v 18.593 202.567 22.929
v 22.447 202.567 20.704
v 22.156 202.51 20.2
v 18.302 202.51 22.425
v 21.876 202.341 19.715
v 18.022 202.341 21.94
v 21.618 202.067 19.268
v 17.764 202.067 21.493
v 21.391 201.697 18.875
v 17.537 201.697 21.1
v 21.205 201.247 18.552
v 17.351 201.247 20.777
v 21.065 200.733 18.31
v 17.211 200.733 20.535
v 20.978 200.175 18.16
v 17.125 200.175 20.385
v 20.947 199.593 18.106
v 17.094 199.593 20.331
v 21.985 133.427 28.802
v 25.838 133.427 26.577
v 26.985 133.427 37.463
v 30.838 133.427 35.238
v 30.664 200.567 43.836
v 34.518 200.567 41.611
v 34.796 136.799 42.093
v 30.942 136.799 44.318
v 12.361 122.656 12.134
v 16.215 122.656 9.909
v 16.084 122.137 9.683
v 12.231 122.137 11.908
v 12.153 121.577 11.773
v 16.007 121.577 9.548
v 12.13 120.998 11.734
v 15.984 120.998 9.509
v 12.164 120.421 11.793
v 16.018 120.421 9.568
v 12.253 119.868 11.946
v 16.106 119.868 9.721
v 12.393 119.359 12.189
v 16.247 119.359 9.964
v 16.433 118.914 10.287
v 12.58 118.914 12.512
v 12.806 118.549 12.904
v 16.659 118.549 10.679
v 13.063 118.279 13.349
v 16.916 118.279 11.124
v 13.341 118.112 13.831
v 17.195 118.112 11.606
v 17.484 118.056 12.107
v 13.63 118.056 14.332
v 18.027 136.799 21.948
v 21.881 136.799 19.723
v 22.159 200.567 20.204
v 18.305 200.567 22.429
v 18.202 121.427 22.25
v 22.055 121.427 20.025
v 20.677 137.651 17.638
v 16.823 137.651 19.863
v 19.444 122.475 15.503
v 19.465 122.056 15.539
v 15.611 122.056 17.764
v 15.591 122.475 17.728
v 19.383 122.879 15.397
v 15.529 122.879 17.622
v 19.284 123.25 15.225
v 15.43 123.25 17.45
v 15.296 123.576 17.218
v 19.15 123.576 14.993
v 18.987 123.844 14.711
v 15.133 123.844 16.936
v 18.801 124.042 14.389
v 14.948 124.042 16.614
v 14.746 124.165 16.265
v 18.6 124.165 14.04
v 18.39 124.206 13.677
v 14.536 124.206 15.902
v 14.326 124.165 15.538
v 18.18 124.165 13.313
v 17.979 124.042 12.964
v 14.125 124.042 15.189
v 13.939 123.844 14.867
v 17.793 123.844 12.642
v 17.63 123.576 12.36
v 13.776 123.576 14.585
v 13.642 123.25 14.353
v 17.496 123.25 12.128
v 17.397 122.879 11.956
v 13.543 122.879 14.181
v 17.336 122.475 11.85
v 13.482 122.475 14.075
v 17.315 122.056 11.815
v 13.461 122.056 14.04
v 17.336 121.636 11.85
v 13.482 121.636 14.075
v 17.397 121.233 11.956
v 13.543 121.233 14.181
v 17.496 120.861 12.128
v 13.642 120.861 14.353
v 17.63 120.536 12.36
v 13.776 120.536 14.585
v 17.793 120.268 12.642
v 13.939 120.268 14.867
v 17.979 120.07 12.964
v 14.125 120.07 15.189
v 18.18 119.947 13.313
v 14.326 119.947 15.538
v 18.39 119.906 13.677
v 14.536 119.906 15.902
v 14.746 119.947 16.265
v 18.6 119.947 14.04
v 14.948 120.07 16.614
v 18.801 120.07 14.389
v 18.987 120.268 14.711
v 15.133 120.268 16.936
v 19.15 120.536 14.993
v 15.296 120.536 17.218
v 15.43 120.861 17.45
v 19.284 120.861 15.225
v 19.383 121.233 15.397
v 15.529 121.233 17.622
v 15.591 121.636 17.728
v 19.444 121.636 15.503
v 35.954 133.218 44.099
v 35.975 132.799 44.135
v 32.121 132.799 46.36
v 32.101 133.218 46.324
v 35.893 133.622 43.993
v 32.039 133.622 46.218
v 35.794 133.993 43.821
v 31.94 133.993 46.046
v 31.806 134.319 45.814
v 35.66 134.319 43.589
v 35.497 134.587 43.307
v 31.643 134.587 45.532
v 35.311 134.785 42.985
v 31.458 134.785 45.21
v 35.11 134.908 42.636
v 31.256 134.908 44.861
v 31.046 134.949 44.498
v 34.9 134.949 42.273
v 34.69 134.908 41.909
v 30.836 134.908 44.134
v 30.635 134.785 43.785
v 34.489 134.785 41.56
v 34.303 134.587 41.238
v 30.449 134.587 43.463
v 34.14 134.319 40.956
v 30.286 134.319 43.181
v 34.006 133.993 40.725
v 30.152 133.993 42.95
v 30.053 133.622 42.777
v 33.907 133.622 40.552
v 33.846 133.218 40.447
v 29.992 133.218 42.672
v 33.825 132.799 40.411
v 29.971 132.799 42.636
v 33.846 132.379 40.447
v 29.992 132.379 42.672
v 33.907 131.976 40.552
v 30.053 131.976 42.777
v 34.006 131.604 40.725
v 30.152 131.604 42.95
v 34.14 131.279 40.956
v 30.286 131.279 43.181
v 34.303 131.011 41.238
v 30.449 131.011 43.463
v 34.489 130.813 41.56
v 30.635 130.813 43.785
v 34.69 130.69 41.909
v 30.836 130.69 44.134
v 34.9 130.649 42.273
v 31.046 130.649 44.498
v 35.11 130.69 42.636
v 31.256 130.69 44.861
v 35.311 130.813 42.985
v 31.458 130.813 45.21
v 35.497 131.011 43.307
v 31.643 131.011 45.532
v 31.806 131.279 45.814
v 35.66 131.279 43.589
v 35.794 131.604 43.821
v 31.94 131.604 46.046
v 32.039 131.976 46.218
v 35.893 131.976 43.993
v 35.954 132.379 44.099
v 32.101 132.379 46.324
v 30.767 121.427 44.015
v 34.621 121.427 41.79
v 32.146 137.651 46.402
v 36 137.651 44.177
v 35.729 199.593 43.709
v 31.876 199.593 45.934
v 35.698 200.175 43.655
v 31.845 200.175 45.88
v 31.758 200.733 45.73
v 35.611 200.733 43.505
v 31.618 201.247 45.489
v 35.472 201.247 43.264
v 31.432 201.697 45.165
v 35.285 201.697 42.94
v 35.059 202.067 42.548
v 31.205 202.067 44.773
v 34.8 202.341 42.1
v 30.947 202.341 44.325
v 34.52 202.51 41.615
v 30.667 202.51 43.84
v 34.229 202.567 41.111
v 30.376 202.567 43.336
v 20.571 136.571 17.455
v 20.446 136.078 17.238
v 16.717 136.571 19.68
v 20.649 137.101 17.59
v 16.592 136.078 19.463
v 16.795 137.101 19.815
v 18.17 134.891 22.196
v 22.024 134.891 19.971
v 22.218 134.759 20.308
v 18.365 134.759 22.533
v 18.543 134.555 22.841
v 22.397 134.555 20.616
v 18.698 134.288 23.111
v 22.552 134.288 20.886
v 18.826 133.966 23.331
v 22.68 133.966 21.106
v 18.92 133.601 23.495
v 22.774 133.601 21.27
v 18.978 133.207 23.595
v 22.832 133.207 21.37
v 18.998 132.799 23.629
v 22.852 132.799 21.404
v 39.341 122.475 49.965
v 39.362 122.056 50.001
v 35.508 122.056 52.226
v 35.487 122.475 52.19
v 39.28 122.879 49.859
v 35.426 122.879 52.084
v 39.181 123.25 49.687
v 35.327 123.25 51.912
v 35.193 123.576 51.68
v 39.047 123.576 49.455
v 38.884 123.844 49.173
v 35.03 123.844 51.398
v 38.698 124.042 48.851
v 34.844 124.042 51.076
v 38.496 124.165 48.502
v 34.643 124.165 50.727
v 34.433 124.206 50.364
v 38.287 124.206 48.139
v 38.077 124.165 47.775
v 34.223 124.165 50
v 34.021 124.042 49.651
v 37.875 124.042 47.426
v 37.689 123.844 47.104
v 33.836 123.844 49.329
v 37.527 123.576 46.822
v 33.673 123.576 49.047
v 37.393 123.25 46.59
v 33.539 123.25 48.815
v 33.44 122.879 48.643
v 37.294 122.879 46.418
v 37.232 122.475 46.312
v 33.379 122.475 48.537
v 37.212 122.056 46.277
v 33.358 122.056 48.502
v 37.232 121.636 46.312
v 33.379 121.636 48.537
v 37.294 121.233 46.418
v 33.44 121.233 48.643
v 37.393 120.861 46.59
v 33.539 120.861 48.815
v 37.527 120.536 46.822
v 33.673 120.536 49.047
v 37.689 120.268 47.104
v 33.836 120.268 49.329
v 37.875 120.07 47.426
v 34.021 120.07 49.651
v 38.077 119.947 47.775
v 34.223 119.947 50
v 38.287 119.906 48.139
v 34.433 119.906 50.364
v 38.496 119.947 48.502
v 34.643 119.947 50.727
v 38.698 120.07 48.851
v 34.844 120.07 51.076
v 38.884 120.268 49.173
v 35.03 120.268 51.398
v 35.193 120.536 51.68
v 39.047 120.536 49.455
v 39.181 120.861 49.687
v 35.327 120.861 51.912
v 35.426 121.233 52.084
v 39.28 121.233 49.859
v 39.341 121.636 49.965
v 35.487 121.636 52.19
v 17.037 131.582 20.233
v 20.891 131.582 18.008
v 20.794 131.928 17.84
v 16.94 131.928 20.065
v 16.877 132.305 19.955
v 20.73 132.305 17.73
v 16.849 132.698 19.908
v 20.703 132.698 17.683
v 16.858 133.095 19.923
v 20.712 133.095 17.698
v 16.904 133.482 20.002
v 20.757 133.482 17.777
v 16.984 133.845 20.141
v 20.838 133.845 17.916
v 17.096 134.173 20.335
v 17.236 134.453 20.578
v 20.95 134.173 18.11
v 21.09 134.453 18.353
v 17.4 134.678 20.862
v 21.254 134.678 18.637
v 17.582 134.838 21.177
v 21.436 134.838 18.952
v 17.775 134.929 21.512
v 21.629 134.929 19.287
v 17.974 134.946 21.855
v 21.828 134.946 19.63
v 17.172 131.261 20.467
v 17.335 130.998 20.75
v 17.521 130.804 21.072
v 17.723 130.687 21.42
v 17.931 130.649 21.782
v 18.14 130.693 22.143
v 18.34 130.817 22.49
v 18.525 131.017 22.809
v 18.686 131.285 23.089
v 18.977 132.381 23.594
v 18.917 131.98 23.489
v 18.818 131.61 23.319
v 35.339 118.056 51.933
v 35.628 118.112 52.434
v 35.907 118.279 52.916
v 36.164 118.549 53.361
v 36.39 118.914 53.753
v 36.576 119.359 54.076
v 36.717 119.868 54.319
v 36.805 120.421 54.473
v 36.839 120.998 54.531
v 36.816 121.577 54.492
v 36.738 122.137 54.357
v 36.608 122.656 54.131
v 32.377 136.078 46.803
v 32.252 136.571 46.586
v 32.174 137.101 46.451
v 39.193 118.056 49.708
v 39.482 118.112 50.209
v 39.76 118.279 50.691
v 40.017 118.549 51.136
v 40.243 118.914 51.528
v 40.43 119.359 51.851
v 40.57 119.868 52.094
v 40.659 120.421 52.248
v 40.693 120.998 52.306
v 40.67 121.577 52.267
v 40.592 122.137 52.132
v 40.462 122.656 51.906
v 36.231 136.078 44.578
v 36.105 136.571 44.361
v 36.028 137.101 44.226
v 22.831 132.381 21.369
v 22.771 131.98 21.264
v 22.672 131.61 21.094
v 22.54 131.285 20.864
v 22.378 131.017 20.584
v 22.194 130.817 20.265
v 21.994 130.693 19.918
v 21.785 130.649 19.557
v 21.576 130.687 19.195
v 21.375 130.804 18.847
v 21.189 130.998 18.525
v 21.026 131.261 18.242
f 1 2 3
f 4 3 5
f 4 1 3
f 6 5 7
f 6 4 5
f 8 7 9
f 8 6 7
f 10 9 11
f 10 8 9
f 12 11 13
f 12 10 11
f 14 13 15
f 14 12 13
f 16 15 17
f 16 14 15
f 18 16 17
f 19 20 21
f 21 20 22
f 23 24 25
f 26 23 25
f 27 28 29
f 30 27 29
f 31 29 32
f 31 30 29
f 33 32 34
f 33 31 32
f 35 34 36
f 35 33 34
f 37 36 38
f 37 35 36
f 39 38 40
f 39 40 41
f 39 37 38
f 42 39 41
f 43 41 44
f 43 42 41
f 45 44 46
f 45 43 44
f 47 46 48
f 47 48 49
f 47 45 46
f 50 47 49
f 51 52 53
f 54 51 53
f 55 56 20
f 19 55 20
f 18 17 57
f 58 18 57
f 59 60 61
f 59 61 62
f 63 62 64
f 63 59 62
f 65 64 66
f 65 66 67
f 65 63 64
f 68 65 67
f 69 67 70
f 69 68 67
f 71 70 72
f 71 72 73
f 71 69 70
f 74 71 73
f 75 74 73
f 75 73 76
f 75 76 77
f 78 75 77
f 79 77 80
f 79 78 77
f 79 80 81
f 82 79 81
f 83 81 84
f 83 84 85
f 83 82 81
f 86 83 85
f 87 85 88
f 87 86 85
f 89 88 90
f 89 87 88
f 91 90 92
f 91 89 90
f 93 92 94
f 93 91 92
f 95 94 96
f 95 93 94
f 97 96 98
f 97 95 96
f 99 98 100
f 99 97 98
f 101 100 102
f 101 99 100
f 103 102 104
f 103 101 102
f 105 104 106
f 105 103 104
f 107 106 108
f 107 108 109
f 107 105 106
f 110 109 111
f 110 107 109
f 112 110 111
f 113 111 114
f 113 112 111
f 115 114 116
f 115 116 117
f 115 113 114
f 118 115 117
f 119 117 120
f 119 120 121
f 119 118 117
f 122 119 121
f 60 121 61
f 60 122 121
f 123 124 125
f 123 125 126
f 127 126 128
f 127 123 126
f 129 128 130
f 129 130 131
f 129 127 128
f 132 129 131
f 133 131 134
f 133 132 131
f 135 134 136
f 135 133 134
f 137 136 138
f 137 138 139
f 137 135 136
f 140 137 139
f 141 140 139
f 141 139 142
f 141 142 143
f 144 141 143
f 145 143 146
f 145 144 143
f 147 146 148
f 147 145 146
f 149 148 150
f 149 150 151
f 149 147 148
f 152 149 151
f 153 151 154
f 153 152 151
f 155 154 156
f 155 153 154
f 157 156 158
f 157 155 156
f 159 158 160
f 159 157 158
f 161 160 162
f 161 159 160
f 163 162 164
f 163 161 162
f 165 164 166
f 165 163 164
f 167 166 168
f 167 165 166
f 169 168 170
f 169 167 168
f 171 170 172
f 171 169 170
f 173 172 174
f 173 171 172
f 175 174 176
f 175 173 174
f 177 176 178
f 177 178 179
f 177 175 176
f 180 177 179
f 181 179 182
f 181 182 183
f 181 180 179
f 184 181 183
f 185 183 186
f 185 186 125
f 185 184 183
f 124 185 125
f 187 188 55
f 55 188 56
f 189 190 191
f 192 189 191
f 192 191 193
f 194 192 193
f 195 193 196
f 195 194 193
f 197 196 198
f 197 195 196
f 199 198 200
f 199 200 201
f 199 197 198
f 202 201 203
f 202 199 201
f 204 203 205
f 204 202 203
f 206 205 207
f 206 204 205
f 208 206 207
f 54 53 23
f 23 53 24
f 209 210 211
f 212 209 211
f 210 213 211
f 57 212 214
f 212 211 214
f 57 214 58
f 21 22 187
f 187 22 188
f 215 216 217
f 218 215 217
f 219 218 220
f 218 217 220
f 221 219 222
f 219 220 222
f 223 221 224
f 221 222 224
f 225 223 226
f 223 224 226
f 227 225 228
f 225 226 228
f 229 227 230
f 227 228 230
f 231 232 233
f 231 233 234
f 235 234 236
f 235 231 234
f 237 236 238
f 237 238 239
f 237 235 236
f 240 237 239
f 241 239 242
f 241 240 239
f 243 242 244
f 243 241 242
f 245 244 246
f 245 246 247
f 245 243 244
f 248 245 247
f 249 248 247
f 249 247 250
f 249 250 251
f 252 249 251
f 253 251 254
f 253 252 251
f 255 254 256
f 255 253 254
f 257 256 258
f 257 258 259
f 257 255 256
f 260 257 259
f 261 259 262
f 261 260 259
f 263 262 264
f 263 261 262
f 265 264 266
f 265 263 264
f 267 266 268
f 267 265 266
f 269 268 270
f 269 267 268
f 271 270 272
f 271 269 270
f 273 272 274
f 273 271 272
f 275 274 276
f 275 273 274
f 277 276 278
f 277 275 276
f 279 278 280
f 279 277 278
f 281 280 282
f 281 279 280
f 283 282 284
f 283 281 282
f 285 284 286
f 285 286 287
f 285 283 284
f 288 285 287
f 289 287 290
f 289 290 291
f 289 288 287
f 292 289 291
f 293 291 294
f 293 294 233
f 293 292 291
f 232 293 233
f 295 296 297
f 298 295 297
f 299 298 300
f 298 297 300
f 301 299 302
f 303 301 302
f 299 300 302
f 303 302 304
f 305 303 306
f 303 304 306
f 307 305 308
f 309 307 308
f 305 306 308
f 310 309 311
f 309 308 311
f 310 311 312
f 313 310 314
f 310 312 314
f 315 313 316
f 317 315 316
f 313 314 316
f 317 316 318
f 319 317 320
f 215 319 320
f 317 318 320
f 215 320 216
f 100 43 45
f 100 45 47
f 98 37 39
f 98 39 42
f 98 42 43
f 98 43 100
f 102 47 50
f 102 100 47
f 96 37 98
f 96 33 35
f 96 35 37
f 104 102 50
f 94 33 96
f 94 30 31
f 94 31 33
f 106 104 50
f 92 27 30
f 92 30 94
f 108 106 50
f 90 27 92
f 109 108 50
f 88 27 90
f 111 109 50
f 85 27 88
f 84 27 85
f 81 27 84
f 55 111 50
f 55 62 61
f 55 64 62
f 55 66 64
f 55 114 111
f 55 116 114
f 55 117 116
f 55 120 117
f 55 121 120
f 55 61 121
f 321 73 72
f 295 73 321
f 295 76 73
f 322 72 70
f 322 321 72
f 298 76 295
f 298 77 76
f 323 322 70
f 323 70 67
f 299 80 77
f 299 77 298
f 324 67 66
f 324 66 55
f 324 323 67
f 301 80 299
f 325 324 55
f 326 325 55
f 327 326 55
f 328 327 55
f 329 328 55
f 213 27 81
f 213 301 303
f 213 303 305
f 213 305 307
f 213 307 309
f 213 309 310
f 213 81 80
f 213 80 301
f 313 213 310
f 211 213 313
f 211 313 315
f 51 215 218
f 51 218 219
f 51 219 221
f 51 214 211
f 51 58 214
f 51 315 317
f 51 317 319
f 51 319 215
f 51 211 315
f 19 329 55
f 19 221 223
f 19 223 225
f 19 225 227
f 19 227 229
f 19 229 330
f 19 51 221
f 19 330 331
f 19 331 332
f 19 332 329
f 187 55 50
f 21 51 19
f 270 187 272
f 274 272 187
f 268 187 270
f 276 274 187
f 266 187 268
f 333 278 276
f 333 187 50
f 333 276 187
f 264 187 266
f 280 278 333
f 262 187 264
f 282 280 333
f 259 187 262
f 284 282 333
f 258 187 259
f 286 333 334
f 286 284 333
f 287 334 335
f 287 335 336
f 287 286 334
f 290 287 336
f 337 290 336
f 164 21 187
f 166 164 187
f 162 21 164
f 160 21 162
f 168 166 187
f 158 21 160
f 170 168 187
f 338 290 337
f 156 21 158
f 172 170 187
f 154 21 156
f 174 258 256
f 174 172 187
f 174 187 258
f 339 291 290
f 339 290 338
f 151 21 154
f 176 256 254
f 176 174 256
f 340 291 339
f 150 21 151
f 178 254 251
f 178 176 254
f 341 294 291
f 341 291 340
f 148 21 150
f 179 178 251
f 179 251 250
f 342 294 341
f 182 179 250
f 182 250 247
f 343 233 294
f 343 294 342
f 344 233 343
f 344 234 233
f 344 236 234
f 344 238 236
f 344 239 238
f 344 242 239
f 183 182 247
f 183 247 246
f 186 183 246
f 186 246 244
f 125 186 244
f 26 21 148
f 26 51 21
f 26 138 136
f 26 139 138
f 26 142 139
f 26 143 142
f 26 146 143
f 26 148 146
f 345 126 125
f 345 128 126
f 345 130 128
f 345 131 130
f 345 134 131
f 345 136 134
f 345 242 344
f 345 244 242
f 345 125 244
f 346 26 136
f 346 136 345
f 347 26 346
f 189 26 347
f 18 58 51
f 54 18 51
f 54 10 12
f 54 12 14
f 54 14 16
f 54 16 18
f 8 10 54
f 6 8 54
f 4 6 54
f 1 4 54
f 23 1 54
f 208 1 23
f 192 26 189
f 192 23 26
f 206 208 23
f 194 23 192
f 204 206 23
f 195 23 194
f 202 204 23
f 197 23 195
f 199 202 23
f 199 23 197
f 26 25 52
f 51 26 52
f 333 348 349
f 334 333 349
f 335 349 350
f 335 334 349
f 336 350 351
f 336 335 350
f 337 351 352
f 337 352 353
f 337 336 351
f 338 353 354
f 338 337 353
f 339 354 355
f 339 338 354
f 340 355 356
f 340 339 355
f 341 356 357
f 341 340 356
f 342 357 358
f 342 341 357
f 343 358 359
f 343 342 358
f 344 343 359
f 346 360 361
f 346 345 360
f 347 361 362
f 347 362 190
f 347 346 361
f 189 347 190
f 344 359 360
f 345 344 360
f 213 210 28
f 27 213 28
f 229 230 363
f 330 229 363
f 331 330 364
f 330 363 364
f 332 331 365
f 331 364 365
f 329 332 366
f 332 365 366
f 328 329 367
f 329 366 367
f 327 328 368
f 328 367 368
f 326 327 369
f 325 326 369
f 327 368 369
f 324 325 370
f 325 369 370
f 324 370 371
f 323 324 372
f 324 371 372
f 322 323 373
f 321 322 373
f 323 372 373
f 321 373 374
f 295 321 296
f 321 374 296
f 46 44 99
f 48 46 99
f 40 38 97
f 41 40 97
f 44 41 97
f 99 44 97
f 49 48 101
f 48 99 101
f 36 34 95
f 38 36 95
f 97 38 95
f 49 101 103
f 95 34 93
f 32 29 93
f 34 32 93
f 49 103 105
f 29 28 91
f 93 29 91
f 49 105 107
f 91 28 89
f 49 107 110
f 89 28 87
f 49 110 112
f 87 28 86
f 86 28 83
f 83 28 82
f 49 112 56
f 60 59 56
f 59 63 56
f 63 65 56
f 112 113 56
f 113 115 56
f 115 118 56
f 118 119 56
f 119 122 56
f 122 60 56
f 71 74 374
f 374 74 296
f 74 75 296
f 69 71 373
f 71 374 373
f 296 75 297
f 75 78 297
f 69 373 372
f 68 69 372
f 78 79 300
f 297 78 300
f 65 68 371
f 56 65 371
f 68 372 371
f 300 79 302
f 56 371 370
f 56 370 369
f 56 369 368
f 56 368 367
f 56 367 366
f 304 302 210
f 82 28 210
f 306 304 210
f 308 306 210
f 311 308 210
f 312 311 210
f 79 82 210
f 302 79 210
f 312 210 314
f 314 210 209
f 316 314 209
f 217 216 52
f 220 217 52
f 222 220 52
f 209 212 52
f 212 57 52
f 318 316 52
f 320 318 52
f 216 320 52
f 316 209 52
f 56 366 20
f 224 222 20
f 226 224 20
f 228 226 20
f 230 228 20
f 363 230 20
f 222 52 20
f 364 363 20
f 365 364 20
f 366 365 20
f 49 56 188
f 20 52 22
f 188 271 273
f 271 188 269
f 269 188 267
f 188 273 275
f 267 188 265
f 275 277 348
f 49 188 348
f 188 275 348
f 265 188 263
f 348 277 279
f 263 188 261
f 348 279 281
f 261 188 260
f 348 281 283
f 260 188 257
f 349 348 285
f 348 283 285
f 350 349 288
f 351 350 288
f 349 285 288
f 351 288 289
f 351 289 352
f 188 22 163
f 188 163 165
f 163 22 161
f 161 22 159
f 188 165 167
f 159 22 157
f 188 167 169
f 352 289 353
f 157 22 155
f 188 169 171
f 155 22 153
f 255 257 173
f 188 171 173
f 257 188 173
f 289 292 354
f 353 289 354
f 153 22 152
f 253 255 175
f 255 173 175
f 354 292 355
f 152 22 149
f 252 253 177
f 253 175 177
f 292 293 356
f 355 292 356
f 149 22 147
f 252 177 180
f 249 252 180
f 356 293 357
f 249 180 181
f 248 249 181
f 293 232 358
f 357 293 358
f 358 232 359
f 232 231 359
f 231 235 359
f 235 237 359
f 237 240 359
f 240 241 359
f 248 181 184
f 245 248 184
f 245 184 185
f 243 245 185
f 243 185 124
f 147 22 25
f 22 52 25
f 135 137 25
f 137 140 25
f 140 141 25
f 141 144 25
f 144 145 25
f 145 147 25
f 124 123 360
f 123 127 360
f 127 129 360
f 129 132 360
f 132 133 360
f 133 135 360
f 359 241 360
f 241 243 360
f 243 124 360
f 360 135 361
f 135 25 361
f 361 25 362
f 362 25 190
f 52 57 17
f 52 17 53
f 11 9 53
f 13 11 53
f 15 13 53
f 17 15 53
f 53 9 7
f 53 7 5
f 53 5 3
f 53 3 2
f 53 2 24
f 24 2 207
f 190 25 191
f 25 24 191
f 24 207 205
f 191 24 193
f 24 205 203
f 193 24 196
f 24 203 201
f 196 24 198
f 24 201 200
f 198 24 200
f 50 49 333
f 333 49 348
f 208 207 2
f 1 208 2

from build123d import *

# Parameters (mm, degrees)
SKETCH1_R           = 2.15
BOSS_EXTRUDE1_DEPTH = 4.45
FILLET1_R           = 3


with BuildPart() as part:
    # Sketch1 → Boss-Extrude1 (new body)
    with BuildSketch(Plane(origin=(7.87040158, 0, -4.543978471), x_dir=(0.5, 0, 0.866025404), z_dir=(-0.866025404, 0, 0.5))):
        Polygon((53.851280609, 136.798849573), (28.020561976, 136.798849573), (25.605878822, 136.798849573), (13.788638888, 118.055853922), (68.083203696, 118.055853922), (56.265963763, 136.798849573), align=None)
        with Locations((21.039254626, 122.055853922)):
            Circle(SKETCH1_R, mode=Mode.SUBTRACT)
        Polygon((53.501781192, 121.427351747), (28.370061392, 121.427351747), (35.935921292, 133.427351747), (45.935921292, 133.427351747), align=None, mode=Mode.SUBTRACT)
        with BuildLine():
            ThreePointArc((28.307564738, 134.891096687), (29.498811561, 134.132697376), (29.962587959, 132.798849573))
            ThreePointArc((29.962587959, 132.798849573), (28.449874626, 130.745470479), (26.040387304, 131.581555509))
            Line((26.040387304, 131.581555509), (25.535036631, 130.843863418))
            Line((25.535036631, 130.843863418), (25.213105243, 131.064400205))
            ThreePointArc((25.213105243, 131.064400205), (24.994059417, 131.449211896), (24.831600224, 131.861119802))
            Line((24.831600224, 131.861119802), (25.010769387, 134.182842957))
            ThreePointArc((25.010769387, 134.182842957), (25.234503174, 134.564948053), (25.509996288, 134.911595794))
            Line((25.509996288, 134.911595794), (27.610252102, 135.917292326))
            ThreePointArc((27.610252102, 135.917292326), (28.053031716, 135.91458573), (28.490984023, 135.849325565))
            Line((28.490984023, 135.849325565), (28.812915411, 135.628788778))
            Line((28.812915411, 135.628788778), (28.307564738, 134.891096687))
        make_face(mode=Mode.SUBTRACT)
        with Locations((54.059254626, 132.798849573)):
            Circle(SKETCH1_R, mode=Mode.SUBTRACT)
        with Locations((60.832587959, 122.055853922)):
            Circle(SKETCH1_R, mode=Mode.SUBTRACT)
        Polygon((28.020561976, 136.798849573), (28.577056843, 200.566845224), (53.294785741, 200.566845224), (53.851280609, 136.798849573), (56.265963763, 136.798849573), (55.69201516, 202.566845224), (26.179827424, 202.566845224), (25.605878822, 136.798849573), align=None)
        with BuildLine():
            ThreePointArc((26.040387304, 131.581555509), (26.038865627, 134.013925327), (28.307564738, 134.891096687))
            Line((28.307564738, 134.891096687), (28.812915411, 135.628788778))
            Line((28.812915411, 135.628788778), (28.490984023, 135.849325565))
            ThreePointArc((28.490984023, 135.849325565), (28.053031716, 135.91458573), (27.610252102, 135.917292326))
            Line((27.610252102, 135.917292326), (25.509996288, 134.911595794))
            ThreePointArc((25.509996288, 134.911595794), (25.234503174, 134.564948053), (25.010769387, 134.182842957))
            Line((25.010769387, 134.182842957), (24.831600224, 131.861119802))
            ThreePointArc((24.831600224, 131.861119802), (24.994059417, 131.449211896), (25.213105243, 131.064400205))
            Line((25.213105243, 131.064400205), (25.535036631, 130.843863418))
            Line((25.535036631, 130.843863418), (26.040387304, 131.581555509))
        make_face()
    extrude(amount=BOSS_EXTRUDE1_DEPTH)

    # Fillet1
    fillet1_edges = [part.edges().sort_by_distance(p)[0] for p in [
        (12.8378145, 118.055853922, 8.50983309),
        (18.746434467, 136.798849573, 18.743863075),
        (19.033408769, 202.566845224, 19.240917146),
        (33.789502636, 202.566845224, 44.799221446),
        (34.076476938, 136.798849573, 45.296275517),
        (39.985096905, 118.055853922, 55.530305501),
    ]]
    fillet(fillet1_edges, radius=FILLET1_R)


solid = part.part
